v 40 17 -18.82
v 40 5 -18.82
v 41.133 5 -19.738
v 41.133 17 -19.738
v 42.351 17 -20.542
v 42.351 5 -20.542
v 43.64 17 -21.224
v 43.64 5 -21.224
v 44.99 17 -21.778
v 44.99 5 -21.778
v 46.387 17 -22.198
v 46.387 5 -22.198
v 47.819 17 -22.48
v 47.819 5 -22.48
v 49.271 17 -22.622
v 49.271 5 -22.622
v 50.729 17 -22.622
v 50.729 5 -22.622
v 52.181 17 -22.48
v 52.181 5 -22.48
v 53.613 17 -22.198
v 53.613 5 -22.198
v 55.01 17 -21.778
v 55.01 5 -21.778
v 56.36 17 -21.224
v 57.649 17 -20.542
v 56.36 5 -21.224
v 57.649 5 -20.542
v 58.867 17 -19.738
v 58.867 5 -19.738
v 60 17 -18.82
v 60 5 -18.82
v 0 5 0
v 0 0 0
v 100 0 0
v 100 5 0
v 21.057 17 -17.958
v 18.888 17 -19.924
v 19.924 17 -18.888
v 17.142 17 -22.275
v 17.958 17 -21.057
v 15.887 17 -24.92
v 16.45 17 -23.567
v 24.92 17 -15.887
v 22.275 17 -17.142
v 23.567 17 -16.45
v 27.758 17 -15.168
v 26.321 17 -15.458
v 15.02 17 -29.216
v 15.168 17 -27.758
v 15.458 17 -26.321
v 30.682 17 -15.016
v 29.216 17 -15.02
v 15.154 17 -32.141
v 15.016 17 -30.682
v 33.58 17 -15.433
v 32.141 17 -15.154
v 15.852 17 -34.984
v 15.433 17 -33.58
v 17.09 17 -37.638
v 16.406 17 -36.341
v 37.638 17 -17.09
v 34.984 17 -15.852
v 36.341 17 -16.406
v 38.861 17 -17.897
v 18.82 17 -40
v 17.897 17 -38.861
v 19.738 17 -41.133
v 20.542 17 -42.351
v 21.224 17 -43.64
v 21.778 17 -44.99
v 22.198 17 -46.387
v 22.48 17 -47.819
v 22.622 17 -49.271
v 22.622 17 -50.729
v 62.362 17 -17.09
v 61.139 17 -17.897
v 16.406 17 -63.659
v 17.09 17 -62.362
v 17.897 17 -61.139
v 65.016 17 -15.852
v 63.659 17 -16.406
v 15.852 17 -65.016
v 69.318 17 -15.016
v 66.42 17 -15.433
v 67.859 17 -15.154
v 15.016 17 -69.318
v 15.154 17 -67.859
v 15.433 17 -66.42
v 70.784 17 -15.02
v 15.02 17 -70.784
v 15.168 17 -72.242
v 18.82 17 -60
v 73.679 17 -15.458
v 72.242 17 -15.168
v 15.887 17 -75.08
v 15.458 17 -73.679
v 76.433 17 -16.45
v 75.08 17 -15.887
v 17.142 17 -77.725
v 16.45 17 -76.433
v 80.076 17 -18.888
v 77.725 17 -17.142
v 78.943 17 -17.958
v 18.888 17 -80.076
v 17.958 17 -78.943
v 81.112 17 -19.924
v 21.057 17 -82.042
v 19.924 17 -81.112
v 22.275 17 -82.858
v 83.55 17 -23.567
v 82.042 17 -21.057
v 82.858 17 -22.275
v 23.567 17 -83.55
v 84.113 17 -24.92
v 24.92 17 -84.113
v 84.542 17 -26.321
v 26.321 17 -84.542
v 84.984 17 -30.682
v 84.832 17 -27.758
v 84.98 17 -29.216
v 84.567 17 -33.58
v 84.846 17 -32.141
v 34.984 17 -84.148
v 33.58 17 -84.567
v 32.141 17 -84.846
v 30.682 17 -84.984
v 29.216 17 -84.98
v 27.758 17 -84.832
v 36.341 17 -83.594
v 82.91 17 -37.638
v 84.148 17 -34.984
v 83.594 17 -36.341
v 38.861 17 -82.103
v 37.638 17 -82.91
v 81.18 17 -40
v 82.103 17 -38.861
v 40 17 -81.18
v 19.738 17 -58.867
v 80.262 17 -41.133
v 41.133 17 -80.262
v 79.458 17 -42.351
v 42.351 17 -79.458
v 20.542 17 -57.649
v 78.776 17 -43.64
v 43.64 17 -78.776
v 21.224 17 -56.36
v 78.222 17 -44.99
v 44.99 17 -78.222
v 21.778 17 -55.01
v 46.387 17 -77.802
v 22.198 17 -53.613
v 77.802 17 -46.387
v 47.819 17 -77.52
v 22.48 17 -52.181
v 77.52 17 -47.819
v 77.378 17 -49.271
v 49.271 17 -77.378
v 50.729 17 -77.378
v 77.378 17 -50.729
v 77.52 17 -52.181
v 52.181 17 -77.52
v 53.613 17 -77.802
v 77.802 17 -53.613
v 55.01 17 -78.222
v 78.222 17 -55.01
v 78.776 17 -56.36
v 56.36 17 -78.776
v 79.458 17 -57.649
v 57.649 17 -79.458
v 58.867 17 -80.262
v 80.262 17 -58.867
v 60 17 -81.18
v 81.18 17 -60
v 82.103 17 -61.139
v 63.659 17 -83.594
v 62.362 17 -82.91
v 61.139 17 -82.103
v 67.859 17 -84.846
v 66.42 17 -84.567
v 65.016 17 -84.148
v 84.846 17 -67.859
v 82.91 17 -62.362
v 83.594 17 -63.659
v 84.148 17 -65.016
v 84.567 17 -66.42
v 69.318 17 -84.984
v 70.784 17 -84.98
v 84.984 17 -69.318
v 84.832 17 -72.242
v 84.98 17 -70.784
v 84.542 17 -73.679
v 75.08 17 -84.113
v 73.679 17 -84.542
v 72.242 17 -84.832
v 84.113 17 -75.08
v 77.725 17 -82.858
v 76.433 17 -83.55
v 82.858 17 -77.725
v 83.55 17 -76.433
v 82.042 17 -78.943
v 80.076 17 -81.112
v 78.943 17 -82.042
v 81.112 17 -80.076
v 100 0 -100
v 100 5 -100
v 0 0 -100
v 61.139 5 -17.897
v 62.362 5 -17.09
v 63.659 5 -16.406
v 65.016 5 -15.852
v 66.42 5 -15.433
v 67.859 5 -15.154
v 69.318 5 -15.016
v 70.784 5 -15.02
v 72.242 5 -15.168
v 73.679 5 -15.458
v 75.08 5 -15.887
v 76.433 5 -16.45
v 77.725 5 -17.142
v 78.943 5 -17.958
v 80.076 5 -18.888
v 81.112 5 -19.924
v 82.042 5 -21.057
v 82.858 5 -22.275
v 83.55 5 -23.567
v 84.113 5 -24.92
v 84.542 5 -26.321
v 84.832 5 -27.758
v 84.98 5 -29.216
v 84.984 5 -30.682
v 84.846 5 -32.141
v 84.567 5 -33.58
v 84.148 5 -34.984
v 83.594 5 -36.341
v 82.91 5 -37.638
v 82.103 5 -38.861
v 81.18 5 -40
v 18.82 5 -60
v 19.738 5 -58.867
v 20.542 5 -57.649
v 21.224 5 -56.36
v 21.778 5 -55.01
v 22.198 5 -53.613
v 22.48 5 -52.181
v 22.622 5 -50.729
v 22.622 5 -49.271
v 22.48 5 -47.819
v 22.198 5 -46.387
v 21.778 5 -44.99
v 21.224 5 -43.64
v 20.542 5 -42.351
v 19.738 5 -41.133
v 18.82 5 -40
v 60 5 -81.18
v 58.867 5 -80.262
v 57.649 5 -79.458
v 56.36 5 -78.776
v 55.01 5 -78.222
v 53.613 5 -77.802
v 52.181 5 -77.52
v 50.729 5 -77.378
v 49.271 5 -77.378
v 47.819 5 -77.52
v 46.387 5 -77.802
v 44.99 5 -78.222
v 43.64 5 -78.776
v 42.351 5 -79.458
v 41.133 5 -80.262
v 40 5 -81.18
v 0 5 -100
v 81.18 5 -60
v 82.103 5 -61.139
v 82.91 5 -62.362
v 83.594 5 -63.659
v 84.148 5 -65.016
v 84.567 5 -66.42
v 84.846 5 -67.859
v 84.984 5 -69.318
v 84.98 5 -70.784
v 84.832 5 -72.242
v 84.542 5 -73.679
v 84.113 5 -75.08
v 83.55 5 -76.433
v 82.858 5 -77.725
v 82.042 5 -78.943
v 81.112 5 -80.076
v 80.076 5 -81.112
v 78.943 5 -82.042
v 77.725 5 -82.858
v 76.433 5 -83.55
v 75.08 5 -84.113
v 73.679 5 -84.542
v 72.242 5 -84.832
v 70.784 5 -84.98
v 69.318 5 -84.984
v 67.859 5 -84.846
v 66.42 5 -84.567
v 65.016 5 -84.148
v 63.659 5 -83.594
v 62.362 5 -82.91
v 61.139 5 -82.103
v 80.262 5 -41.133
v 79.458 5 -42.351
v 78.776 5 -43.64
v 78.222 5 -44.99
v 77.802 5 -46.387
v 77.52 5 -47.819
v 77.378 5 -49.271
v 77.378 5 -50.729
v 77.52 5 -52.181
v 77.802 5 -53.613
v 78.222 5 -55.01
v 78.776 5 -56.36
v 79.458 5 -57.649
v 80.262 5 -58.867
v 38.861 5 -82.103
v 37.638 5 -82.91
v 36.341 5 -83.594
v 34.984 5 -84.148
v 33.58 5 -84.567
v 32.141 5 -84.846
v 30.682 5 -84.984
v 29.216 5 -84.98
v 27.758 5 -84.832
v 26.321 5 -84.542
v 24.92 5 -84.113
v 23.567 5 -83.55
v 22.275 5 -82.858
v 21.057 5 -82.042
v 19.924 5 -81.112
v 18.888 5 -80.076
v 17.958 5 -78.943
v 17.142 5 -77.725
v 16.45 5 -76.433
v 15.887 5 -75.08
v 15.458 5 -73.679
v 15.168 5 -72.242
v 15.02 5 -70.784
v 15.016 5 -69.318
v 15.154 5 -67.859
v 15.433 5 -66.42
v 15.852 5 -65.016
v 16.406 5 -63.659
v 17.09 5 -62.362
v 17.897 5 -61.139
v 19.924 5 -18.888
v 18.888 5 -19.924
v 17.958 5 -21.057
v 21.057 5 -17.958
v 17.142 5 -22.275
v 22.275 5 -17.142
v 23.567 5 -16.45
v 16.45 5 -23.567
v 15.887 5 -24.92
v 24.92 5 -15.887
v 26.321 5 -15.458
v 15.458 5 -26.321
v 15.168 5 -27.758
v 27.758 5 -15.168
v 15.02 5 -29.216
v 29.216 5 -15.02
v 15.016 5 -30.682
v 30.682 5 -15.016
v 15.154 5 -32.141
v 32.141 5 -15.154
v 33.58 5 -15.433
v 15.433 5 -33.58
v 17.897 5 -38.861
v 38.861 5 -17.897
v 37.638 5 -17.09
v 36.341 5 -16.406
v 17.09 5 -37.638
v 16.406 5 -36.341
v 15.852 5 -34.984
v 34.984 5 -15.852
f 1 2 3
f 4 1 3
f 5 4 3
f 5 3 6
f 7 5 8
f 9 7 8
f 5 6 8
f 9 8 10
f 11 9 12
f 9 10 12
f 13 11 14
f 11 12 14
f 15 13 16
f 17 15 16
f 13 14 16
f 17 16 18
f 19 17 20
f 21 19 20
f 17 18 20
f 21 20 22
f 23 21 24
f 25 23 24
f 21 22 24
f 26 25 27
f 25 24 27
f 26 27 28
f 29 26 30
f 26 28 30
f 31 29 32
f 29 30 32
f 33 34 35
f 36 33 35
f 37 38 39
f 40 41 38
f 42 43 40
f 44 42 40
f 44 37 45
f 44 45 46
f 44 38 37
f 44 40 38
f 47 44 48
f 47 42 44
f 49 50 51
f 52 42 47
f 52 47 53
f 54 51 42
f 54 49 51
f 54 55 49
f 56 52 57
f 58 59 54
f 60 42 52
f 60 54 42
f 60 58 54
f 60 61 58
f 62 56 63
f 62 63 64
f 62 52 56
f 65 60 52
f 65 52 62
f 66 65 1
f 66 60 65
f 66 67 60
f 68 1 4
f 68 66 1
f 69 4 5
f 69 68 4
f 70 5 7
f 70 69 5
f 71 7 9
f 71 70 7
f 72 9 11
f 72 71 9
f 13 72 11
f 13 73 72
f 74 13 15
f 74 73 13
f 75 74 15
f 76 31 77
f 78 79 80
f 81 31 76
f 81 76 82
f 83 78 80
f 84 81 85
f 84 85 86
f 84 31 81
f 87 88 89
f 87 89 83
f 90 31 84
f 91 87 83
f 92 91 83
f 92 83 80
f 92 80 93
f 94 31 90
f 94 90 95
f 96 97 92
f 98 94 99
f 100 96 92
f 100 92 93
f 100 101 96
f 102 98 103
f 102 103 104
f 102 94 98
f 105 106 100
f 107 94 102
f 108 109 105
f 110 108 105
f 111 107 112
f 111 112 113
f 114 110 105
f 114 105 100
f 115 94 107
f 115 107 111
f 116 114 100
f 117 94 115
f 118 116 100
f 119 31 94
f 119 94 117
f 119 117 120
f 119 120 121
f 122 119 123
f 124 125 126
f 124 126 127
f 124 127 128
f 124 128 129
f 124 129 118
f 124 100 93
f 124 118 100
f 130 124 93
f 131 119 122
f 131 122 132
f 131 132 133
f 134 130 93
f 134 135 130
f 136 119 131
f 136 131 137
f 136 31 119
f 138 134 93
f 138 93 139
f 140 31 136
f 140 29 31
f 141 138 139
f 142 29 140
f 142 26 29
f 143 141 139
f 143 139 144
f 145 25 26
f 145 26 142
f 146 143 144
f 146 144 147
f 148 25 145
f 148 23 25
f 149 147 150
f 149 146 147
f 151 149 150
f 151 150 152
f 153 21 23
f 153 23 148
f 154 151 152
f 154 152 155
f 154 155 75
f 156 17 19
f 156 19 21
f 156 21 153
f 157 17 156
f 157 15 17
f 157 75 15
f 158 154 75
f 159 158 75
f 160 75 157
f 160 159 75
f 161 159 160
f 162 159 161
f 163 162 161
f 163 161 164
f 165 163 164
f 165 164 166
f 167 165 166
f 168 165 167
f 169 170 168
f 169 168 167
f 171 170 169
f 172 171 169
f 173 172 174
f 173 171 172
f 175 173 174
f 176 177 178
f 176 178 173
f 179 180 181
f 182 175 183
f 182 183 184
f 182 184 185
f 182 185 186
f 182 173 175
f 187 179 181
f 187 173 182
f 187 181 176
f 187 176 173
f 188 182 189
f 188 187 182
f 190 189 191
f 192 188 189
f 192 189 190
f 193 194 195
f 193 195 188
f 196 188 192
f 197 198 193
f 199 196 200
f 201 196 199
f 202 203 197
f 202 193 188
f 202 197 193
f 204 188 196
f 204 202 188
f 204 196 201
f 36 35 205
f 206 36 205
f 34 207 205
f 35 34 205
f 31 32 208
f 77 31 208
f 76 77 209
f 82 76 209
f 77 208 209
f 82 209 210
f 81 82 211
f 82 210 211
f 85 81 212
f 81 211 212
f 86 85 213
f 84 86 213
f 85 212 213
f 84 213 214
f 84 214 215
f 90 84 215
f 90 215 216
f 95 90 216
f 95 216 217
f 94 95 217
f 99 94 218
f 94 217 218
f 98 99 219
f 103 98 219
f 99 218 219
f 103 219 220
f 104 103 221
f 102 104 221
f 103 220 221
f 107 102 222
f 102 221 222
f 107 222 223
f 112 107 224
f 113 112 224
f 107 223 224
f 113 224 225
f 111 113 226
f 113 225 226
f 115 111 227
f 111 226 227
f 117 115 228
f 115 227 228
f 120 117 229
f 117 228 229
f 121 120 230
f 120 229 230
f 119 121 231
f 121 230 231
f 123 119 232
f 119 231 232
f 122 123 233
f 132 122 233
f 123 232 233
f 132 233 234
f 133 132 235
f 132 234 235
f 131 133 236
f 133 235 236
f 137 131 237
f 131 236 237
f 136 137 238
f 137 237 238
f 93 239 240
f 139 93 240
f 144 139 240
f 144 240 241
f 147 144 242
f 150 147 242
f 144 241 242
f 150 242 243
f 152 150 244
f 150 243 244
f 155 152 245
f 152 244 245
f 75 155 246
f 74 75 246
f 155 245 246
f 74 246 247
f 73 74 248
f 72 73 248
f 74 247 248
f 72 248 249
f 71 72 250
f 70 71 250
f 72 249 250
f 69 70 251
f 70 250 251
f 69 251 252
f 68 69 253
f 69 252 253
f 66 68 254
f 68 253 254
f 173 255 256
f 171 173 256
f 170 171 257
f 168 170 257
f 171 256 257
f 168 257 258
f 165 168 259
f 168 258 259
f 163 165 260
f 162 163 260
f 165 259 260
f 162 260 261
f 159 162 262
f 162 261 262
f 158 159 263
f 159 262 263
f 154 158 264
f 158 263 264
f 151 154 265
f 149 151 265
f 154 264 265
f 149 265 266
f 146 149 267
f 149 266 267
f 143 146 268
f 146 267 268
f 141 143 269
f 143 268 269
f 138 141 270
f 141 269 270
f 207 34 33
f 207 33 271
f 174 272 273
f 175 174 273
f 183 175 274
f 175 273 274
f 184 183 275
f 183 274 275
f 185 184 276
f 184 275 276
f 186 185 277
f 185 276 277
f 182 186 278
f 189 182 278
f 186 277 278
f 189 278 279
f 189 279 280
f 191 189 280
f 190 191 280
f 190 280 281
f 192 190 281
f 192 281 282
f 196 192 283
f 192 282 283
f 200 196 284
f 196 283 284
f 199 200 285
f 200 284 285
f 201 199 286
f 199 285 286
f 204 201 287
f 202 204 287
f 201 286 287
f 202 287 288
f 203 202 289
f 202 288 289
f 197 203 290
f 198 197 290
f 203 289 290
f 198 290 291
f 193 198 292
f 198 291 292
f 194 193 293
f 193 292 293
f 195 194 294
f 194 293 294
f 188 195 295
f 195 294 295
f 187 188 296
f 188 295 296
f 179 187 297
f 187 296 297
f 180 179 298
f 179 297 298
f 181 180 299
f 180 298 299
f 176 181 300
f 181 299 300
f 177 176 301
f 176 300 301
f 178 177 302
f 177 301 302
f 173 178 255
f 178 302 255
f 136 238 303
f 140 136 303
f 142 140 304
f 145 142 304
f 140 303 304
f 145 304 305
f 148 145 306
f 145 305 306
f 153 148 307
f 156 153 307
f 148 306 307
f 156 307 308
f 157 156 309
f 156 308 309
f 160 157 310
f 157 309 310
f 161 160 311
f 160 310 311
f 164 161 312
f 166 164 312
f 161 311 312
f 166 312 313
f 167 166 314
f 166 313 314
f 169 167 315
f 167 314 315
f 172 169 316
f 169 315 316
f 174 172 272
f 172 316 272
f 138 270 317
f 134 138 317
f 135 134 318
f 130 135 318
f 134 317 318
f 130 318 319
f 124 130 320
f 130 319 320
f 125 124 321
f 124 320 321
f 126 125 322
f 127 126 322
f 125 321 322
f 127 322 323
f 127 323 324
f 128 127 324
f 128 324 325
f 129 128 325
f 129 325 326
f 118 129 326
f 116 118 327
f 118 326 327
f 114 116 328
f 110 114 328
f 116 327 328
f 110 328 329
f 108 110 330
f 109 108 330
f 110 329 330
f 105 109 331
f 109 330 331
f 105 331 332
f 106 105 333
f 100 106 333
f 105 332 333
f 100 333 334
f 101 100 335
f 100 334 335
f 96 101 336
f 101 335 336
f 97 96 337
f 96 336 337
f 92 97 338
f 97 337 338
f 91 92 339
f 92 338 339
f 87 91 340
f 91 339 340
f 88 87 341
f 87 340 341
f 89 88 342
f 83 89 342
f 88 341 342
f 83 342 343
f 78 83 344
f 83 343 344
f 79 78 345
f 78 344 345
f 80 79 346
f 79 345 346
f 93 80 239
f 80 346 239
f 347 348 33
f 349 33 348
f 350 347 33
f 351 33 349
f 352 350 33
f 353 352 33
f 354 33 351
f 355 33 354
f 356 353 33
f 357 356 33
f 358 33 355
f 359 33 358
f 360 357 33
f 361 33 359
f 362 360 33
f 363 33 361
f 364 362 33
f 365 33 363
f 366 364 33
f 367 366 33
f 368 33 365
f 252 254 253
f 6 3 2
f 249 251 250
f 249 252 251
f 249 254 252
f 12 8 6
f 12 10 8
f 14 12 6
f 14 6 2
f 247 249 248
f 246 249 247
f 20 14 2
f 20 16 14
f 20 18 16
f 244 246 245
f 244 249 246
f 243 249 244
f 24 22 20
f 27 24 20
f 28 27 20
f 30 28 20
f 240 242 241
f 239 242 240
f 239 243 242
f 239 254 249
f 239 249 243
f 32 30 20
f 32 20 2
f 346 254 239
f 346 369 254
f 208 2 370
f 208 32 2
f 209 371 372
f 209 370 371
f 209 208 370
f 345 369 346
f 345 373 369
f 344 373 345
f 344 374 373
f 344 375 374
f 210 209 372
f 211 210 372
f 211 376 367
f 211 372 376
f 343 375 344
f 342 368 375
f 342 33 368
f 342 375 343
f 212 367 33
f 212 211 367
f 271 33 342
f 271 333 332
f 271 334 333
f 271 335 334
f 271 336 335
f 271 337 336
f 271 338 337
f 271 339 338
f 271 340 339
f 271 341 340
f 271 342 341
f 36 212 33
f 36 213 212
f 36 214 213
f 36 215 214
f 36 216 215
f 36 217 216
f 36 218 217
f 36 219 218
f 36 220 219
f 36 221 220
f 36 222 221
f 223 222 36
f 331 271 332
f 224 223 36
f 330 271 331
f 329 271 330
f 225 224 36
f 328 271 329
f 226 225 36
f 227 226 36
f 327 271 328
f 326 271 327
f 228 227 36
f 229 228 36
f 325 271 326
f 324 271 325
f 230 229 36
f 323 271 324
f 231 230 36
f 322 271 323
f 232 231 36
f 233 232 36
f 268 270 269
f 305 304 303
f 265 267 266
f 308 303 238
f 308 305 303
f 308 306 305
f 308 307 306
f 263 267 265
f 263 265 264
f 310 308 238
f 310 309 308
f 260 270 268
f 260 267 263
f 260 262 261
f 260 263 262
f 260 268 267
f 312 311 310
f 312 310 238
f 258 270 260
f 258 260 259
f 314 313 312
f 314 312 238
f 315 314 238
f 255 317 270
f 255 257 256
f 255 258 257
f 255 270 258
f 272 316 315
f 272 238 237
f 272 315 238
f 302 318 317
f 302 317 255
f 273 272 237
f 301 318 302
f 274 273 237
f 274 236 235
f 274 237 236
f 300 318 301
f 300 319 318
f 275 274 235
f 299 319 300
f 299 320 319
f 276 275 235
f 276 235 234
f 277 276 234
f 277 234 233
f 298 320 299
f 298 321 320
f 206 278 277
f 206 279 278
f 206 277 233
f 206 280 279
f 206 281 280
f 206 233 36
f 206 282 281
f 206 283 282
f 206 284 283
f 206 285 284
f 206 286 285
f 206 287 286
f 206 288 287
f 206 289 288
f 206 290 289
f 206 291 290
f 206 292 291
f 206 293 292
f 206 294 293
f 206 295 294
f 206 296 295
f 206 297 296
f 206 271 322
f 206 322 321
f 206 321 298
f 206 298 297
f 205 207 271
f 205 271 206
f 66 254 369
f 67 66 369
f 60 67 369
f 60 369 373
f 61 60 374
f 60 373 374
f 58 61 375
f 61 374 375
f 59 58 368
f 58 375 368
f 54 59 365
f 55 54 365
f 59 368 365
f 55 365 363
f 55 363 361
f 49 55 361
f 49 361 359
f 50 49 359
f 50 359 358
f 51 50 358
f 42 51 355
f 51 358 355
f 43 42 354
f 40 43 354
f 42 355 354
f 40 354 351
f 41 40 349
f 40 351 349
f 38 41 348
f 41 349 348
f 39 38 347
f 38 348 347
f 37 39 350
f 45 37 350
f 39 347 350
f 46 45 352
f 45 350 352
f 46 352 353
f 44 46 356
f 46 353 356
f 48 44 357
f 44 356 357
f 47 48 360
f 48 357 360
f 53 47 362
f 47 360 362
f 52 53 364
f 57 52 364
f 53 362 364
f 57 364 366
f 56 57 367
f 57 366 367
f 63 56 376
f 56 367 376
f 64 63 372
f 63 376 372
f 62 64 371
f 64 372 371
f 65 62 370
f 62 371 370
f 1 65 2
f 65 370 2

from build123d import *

# Parameters (mm, degrees)
SKETCH5_W           = 100
SKETCH5_H           = 100
BOSS_EXTRUDE1_DEPTH = 5
BOSS_EXTRUDE2_DEPTH = 12


with BuildPart() as part:
    # Sketch5 → Boss-Extrude1 (new body)
    with BuildSketch(Plane(origin=(0, 0, 0), x_dir=(1, 0, 0), z_dir=(0, 1, 0))):
        with Locations((50, 50)):
            Rectangle(SKETCH5_W, SKETCH5_H)
    extrude(amount=BOSS_EXTRUDE1_DEPTH)

    # Sketch7 → Boss-Extrude2 (add)
    with BuildSketch(Plane(origin=(0, 5, 0), x_dir=(1, 0, 0), z_dir=(0, 1, 0))):
        with BuildLine():
            ThreePointArc((81.180339887, 60), (80.606601718, 80.606601718), (60, 81.180339887))
            ThreePointArc((60, 81.180339887), (50, 77.360679775), (40, 81.180339887))
            ThreePointArc((40, 81.180339887), (19.393398282, 80.606601718), (18.819660113, 60))
            ThreePointArc((18.819660113, 60), (22.639320225, 50), (18.819660113, 40))
            ThreePointArc((18.819660113, 40), (19.393398282, 19.393398282), (40, 18.819660113))
            ThreePointArc((40, 18.819660113), (50, 22.639320225), (60, 18.819660113))
            ThreePointArc((60, 18.819660113), (80.606601718, 19.393398282), (81.180339887, 40))
            ThreePointArc((81.180339887, 40), (77.360679775, 50), (81.180339887, 60))
        make_face()
    extrude(amount=BOSS_EXTRUDE2_DEPTH)


solid = part.part
